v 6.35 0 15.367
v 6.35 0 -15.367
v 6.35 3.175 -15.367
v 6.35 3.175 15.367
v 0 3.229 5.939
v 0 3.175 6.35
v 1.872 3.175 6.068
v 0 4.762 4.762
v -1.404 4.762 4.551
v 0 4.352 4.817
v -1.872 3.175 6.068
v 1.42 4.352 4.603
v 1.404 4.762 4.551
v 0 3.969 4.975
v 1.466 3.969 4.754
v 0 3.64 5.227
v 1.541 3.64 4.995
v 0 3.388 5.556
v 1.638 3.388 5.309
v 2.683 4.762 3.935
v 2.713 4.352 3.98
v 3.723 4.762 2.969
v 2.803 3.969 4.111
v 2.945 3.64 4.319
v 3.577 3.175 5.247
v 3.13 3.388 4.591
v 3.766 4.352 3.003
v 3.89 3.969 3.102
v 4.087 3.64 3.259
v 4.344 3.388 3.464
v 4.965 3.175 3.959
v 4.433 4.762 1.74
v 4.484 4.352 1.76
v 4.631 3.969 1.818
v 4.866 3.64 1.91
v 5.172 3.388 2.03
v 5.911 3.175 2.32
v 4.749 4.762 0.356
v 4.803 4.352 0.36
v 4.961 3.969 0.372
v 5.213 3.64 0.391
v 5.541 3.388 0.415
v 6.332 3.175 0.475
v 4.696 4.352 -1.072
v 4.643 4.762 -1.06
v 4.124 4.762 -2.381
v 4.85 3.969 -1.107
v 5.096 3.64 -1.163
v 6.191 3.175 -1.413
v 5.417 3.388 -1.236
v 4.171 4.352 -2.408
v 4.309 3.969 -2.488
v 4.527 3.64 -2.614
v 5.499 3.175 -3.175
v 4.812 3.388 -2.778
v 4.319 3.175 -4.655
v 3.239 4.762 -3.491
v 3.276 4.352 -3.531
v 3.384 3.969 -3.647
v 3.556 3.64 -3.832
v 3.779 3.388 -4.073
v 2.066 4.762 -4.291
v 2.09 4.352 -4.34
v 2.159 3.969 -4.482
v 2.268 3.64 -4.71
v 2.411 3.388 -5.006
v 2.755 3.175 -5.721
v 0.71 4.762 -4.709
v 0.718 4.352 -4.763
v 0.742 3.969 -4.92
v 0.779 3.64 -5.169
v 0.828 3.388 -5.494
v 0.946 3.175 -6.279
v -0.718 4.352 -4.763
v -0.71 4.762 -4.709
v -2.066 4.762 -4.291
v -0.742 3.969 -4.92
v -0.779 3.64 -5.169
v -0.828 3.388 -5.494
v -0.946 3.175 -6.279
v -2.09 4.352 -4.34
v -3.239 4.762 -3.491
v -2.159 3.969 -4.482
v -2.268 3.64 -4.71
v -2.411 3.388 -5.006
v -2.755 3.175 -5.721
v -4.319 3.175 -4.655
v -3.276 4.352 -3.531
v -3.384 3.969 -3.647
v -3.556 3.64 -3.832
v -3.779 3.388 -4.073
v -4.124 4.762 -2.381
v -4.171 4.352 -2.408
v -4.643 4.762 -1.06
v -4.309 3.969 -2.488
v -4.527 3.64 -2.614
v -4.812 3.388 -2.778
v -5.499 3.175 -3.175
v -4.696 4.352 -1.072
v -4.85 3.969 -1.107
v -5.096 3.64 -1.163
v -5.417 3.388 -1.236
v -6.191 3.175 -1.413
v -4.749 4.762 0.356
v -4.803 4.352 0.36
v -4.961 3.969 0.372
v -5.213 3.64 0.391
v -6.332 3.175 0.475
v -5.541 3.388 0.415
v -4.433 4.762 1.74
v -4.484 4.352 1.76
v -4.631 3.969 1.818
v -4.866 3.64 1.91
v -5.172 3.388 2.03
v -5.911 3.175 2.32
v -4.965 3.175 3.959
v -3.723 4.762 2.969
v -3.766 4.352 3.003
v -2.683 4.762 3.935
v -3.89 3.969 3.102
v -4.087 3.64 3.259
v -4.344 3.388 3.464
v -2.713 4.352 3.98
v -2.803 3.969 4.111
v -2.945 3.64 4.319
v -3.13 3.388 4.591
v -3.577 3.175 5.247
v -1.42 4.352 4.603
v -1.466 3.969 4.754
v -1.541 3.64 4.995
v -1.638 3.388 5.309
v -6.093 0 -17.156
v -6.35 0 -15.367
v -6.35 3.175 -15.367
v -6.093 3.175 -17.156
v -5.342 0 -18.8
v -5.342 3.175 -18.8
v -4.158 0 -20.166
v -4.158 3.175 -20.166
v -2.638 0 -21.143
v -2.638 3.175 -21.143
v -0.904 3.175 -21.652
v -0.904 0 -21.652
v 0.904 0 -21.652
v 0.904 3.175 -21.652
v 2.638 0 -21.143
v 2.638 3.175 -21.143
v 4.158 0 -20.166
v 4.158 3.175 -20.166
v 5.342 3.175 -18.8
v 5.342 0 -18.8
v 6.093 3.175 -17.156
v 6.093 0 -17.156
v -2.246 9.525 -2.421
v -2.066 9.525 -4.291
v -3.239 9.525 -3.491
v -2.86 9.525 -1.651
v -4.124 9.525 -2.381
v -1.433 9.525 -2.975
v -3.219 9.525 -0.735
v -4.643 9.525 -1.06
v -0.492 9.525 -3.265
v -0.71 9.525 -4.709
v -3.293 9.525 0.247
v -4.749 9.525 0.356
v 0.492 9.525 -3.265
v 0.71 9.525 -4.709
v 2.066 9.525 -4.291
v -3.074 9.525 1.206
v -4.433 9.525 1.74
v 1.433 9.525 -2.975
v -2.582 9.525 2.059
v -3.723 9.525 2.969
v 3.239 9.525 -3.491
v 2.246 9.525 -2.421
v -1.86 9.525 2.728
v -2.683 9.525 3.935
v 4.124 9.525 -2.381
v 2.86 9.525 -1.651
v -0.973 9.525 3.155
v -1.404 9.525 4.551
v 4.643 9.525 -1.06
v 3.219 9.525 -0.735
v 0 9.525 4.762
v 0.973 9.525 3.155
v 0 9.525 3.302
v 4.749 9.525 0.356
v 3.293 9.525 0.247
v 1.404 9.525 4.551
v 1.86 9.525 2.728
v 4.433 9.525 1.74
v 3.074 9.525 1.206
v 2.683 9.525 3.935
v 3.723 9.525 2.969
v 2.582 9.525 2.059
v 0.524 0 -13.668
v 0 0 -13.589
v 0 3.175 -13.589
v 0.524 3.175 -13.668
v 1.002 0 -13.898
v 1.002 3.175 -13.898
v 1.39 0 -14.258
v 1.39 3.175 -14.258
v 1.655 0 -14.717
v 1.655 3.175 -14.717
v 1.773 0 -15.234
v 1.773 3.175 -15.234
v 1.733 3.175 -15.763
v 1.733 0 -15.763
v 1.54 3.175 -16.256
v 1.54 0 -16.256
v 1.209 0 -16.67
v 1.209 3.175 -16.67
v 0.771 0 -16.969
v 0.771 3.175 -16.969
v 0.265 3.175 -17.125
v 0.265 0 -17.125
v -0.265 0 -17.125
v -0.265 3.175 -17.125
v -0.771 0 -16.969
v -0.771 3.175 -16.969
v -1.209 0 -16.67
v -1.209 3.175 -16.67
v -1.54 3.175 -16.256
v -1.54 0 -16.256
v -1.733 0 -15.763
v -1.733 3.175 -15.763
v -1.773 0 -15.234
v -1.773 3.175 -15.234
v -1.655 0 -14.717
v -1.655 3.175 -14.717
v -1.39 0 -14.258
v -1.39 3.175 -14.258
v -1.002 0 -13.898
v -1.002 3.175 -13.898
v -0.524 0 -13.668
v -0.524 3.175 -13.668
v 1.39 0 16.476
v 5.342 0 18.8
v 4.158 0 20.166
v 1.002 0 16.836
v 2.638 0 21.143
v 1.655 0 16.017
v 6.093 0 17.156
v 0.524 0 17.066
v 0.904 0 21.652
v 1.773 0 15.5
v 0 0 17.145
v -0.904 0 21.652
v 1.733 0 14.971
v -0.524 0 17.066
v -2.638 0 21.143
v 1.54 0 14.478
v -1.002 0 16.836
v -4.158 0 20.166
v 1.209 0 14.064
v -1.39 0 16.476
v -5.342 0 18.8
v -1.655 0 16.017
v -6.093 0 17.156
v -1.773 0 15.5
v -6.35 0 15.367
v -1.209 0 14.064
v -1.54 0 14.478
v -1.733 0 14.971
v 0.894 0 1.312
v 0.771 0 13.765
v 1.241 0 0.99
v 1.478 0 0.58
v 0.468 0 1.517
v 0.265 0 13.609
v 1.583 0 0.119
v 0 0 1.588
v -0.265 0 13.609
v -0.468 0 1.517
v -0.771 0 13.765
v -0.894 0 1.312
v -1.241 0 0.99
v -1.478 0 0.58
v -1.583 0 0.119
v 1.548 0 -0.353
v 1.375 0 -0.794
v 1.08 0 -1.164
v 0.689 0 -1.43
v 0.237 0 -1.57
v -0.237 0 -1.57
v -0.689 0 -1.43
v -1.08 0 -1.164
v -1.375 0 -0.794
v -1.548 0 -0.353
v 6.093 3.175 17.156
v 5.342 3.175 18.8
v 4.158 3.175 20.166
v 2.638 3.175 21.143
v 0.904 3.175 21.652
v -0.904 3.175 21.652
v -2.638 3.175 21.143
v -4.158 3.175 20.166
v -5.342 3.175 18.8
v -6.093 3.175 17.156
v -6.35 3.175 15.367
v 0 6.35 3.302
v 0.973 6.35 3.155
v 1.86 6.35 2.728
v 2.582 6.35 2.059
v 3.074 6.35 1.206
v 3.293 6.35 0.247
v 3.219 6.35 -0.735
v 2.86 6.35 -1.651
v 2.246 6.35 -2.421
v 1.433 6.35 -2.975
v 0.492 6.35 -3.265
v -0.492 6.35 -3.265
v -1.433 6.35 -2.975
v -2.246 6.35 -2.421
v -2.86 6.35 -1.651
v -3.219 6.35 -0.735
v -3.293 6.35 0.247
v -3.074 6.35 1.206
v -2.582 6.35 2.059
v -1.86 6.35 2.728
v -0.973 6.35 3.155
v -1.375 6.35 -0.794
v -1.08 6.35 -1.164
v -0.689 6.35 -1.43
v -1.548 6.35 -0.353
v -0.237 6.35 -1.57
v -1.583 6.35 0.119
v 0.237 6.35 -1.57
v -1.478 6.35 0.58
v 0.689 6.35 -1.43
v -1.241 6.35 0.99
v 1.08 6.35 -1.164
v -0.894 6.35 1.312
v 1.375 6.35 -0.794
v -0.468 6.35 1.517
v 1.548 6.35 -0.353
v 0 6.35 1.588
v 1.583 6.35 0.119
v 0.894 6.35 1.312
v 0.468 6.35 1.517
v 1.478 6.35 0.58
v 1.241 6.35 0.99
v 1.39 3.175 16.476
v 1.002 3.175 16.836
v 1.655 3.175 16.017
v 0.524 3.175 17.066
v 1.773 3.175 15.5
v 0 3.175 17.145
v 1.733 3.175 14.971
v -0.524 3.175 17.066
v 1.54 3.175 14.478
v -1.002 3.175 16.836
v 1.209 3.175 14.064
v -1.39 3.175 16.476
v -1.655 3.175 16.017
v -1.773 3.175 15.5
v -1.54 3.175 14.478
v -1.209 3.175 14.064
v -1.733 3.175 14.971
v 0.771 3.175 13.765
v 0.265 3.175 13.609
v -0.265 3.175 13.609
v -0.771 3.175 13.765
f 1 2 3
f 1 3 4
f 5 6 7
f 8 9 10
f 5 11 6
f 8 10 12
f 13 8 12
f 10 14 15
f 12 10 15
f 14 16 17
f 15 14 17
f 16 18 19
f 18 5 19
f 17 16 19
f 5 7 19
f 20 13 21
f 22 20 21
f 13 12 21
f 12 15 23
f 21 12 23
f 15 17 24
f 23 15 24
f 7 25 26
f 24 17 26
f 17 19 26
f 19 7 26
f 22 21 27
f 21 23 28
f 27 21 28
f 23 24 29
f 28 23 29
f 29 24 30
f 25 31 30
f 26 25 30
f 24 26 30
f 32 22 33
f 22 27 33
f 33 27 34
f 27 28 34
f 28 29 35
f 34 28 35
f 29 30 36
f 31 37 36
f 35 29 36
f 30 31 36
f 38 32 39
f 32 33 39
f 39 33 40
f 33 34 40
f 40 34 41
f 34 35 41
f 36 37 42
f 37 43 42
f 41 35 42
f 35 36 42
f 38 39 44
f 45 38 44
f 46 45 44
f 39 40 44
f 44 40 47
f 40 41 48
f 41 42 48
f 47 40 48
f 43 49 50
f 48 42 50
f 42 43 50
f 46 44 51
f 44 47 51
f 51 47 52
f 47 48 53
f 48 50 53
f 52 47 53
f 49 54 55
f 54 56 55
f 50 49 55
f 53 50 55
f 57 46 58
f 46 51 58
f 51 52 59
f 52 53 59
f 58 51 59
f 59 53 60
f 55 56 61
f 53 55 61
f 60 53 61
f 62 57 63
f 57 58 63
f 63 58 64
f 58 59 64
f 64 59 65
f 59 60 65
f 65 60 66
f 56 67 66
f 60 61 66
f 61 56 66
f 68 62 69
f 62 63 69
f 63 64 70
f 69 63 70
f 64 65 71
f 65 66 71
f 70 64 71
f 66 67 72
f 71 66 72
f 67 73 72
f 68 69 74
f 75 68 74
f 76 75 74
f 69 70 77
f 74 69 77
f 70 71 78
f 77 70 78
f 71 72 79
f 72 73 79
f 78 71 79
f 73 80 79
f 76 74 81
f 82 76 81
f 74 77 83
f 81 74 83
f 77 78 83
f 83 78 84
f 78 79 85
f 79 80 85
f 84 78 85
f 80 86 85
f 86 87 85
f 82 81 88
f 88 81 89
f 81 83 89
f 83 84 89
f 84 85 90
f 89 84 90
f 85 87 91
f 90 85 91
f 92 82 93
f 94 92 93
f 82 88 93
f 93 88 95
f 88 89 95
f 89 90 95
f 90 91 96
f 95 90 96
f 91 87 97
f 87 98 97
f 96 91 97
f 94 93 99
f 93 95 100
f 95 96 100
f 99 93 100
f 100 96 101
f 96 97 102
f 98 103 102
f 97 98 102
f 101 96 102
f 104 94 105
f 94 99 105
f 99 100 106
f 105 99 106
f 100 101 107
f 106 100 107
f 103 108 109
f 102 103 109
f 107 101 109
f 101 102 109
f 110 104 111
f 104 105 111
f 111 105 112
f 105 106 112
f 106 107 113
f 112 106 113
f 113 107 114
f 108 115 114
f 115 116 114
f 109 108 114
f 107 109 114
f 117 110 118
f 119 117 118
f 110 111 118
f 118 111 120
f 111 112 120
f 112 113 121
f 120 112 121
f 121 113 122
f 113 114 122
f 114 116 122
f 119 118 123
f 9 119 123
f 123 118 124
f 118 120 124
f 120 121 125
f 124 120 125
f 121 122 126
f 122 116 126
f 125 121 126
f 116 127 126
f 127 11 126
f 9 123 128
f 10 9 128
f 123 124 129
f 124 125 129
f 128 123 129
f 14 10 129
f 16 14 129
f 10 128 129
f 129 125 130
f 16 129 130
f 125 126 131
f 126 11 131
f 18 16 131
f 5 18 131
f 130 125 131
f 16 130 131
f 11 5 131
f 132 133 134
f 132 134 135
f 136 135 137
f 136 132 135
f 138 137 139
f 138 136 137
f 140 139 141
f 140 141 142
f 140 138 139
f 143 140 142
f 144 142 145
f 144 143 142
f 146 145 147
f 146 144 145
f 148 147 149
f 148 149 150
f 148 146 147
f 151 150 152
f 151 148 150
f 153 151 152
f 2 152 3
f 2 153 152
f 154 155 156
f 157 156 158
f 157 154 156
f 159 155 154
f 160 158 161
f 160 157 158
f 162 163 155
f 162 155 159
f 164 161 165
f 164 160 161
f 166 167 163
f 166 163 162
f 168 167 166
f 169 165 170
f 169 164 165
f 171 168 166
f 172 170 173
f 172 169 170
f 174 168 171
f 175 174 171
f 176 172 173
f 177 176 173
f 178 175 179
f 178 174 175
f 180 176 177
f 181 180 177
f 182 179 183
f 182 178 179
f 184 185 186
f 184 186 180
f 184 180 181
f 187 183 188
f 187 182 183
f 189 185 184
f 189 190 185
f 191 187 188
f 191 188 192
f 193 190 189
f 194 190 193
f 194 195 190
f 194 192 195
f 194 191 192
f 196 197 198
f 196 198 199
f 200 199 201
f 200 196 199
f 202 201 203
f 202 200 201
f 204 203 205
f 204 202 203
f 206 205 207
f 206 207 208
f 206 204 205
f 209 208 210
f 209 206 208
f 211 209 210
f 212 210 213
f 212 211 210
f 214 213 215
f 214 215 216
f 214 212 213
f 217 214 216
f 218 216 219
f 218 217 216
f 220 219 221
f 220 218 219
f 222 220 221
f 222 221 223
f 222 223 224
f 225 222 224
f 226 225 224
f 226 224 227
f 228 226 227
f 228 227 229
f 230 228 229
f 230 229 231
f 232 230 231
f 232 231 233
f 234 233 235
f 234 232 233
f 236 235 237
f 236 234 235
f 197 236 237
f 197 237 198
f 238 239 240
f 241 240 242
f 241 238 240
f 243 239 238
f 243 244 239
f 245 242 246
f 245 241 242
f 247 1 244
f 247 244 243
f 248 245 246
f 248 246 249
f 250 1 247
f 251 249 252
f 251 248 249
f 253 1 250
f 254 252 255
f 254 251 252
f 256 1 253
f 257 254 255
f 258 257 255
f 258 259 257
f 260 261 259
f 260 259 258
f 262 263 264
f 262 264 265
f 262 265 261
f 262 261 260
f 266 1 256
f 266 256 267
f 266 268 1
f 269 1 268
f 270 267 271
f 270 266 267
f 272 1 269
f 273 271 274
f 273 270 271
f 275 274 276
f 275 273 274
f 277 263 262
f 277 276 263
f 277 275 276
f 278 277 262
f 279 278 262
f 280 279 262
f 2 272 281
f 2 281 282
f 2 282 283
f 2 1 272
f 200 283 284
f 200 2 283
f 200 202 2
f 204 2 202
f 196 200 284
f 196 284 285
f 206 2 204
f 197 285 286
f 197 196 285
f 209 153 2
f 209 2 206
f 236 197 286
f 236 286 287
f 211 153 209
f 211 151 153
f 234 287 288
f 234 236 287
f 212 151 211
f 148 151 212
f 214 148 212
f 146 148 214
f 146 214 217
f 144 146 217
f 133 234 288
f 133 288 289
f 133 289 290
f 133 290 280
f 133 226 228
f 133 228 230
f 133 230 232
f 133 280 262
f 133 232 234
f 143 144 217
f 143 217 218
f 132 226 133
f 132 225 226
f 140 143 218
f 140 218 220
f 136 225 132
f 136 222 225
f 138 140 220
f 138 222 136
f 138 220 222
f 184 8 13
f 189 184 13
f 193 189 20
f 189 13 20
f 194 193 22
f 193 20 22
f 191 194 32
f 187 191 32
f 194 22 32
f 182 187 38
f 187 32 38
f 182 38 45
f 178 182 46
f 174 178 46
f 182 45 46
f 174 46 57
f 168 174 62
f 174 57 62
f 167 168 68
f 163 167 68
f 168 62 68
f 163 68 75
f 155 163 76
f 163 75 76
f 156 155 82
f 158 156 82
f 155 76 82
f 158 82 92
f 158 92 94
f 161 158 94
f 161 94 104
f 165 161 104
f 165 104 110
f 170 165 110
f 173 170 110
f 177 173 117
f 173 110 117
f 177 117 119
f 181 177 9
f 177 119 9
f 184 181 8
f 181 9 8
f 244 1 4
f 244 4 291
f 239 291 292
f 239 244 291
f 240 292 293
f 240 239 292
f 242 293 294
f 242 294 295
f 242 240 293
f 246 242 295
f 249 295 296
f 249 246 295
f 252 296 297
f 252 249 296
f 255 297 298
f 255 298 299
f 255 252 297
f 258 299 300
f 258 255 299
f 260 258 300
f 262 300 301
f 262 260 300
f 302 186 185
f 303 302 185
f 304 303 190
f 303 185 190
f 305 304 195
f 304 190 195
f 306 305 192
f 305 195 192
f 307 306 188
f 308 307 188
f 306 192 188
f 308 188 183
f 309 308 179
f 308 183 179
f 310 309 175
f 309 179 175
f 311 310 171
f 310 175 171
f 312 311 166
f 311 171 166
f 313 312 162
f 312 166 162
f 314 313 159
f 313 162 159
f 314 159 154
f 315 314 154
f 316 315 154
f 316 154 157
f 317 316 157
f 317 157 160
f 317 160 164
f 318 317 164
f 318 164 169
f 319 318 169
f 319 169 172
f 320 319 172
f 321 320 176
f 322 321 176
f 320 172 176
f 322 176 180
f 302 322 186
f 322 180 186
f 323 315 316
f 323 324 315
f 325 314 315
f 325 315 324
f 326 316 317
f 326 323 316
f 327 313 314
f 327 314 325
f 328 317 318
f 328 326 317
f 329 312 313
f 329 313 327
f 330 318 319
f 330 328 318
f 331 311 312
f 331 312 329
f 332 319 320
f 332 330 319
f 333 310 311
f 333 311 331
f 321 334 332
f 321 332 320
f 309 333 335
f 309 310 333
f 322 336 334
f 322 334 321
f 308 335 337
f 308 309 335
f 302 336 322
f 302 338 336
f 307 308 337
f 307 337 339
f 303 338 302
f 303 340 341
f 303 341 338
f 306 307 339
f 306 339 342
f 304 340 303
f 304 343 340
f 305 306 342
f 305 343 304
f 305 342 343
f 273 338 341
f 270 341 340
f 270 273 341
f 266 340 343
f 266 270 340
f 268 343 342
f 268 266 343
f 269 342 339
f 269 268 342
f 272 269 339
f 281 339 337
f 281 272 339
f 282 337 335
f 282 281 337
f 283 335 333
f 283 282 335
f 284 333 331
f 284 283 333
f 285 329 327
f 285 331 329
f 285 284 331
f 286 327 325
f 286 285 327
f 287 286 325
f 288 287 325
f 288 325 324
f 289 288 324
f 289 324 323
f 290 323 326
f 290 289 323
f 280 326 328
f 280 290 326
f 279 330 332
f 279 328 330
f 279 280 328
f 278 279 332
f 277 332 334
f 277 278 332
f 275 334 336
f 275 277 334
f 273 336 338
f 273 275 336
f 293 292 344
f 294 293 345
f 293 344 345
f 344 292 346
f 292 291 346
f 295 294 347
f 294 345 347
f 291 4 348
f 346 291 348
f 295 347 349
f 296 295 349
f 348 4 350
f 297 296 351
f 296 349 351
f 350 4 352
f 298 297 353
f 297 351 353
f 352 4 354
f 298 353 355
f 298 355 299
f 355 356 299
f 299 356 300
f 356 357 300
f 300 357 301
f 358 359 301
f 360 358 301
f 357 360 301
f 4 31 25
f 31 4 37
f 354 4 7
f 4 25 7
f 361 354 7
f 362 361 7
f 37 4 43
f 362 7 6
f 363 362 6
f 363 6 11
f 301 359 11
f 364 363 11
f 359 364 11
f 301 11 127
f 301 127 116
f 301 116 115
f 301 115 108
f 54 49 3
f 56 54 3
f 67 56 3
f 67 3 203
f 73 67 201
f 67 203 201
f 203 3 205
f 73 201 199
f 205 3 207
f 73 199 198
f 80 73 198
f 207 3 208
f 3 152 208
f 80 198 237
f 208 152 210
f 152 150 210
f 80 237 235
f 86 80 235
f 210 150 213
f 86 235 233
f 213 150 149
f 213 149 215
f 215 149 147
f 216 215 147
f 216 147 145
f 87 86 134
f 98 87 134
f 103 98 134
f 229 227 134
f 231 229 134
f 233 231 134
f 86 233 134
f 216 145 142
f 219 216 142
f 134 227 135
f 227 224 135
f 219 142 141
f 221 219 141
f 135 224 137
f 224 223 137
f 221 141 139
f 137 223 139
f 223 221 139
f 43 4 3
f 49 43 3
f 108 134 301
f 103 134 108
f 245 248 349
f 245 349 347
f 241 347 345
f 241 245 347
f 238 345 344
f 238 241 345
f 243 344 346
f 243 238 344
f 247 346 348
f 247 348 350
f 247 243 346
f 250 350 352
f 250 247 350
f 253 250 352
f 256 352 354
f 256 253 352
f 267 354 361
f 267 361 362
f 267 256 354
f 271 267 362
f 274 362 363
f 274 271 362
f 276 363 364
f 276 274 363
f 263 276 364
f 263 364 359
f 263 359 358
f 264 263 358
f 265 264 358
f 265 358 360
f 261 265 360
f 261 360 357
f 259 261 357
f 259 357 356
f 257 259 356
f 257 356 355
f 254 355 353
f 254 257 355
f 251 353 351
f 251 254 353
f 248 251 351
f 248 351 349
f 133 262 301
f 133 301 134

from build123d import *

# Parameters (mm, degrees)
SKETCH1_R           = 1.778
SKETCH1_R_2         = 1.5875
BOSS_EXTRUDE1_DEPTH = 3.175
SKETCH2_R           = 4.7625
SKETCH2_R_2         = 1.5875
BOSS_EXTRUDE2_DEPTH = 6.35
SKETCH3_R           = 3.302
CUT_EXTRUDE1_DEPTH  = 3.175
FILLET1_R           = 1.5875


with BuildPart() as part:
    # Sketch1 → Boss-Extrude1 (new body)
    with BuildSketch(Plane(origin=(0, 0, 0), x_dir=(1, 0, 0), z_dir=(0, 1, 0))):
        with BuildLine():
            Line((6.35, 15.367), (6.35, -15.367))
            ThreePointArc((6.35, -15.367), (0, -21.717), (-6.35, -15.367))
            Line((-6.35, -15.367), (-6.35, 15.367))
            ThreePointArc((-6.35, 15.367), (0, 21.717), (6.35, 15.367))
        make_face()
        with Locations(Location((0, 15.367, 0), (0, 0, 270))):
            Circle(SKETCH1_R, mode=Mode.SUBTRACT)
        with Locations(Location((0, -15.367, 0), (0, 0, 270))):
            Circle(SKETCH1_R, mode=Mode.SUBTRACT)
        with Locations(Location((0, 0, 0), (0, 0, 270))):
            Circle(SKETCH1_R_2, mode=Mode.SUBTRACT)
    extrude(amount=BOSS_EXTRUDE1_DEPTH)

    # Sketch2 → Boss-Extrude2 (add)
    with BuildSketch(Plane(origin=(0, 3.175, 0), x_dir=(1, 0, 0), z_dir=(0, 1, 0))):
        with Locations(Location((0, 0, 0), (0, 0, 270))):
            Circle(SKETCH2_R)
        with Locations(Location((0, 0, 0), (0, 0, 270))):
            Circle(SKETCH2_R_2, mode=Mode.SUBTRACT)
    extrude(amount=BOSS_EXTRUDE2_DEPTH)

    # Sketch3 → Cut-Extrude1 (cut)
    with BuildSketch(Plane(origin=(0, 9.525, 0), x_dir=(1, 0, 0), z_dir=(0, 1, 0))):
        with Locations(Location((0, 0, 0), (0, 0, 270))):
            Circle(SKETCH3_R)
    extrude(amount=-CUT_EXTRUDE1_DEPTH, mode=Mode.SUBTRACT)

    # Fillet1
    fillet1_edges = [part.edges().sort_by_distance(p)[0] for p in [
        (0, 3.175, -4.7625),
    ]]
    fillet(fillet1_edges, radius=FILLET1_R - 0.0001)  # a hair under: the kernel refuses the full size


solid = part.part
